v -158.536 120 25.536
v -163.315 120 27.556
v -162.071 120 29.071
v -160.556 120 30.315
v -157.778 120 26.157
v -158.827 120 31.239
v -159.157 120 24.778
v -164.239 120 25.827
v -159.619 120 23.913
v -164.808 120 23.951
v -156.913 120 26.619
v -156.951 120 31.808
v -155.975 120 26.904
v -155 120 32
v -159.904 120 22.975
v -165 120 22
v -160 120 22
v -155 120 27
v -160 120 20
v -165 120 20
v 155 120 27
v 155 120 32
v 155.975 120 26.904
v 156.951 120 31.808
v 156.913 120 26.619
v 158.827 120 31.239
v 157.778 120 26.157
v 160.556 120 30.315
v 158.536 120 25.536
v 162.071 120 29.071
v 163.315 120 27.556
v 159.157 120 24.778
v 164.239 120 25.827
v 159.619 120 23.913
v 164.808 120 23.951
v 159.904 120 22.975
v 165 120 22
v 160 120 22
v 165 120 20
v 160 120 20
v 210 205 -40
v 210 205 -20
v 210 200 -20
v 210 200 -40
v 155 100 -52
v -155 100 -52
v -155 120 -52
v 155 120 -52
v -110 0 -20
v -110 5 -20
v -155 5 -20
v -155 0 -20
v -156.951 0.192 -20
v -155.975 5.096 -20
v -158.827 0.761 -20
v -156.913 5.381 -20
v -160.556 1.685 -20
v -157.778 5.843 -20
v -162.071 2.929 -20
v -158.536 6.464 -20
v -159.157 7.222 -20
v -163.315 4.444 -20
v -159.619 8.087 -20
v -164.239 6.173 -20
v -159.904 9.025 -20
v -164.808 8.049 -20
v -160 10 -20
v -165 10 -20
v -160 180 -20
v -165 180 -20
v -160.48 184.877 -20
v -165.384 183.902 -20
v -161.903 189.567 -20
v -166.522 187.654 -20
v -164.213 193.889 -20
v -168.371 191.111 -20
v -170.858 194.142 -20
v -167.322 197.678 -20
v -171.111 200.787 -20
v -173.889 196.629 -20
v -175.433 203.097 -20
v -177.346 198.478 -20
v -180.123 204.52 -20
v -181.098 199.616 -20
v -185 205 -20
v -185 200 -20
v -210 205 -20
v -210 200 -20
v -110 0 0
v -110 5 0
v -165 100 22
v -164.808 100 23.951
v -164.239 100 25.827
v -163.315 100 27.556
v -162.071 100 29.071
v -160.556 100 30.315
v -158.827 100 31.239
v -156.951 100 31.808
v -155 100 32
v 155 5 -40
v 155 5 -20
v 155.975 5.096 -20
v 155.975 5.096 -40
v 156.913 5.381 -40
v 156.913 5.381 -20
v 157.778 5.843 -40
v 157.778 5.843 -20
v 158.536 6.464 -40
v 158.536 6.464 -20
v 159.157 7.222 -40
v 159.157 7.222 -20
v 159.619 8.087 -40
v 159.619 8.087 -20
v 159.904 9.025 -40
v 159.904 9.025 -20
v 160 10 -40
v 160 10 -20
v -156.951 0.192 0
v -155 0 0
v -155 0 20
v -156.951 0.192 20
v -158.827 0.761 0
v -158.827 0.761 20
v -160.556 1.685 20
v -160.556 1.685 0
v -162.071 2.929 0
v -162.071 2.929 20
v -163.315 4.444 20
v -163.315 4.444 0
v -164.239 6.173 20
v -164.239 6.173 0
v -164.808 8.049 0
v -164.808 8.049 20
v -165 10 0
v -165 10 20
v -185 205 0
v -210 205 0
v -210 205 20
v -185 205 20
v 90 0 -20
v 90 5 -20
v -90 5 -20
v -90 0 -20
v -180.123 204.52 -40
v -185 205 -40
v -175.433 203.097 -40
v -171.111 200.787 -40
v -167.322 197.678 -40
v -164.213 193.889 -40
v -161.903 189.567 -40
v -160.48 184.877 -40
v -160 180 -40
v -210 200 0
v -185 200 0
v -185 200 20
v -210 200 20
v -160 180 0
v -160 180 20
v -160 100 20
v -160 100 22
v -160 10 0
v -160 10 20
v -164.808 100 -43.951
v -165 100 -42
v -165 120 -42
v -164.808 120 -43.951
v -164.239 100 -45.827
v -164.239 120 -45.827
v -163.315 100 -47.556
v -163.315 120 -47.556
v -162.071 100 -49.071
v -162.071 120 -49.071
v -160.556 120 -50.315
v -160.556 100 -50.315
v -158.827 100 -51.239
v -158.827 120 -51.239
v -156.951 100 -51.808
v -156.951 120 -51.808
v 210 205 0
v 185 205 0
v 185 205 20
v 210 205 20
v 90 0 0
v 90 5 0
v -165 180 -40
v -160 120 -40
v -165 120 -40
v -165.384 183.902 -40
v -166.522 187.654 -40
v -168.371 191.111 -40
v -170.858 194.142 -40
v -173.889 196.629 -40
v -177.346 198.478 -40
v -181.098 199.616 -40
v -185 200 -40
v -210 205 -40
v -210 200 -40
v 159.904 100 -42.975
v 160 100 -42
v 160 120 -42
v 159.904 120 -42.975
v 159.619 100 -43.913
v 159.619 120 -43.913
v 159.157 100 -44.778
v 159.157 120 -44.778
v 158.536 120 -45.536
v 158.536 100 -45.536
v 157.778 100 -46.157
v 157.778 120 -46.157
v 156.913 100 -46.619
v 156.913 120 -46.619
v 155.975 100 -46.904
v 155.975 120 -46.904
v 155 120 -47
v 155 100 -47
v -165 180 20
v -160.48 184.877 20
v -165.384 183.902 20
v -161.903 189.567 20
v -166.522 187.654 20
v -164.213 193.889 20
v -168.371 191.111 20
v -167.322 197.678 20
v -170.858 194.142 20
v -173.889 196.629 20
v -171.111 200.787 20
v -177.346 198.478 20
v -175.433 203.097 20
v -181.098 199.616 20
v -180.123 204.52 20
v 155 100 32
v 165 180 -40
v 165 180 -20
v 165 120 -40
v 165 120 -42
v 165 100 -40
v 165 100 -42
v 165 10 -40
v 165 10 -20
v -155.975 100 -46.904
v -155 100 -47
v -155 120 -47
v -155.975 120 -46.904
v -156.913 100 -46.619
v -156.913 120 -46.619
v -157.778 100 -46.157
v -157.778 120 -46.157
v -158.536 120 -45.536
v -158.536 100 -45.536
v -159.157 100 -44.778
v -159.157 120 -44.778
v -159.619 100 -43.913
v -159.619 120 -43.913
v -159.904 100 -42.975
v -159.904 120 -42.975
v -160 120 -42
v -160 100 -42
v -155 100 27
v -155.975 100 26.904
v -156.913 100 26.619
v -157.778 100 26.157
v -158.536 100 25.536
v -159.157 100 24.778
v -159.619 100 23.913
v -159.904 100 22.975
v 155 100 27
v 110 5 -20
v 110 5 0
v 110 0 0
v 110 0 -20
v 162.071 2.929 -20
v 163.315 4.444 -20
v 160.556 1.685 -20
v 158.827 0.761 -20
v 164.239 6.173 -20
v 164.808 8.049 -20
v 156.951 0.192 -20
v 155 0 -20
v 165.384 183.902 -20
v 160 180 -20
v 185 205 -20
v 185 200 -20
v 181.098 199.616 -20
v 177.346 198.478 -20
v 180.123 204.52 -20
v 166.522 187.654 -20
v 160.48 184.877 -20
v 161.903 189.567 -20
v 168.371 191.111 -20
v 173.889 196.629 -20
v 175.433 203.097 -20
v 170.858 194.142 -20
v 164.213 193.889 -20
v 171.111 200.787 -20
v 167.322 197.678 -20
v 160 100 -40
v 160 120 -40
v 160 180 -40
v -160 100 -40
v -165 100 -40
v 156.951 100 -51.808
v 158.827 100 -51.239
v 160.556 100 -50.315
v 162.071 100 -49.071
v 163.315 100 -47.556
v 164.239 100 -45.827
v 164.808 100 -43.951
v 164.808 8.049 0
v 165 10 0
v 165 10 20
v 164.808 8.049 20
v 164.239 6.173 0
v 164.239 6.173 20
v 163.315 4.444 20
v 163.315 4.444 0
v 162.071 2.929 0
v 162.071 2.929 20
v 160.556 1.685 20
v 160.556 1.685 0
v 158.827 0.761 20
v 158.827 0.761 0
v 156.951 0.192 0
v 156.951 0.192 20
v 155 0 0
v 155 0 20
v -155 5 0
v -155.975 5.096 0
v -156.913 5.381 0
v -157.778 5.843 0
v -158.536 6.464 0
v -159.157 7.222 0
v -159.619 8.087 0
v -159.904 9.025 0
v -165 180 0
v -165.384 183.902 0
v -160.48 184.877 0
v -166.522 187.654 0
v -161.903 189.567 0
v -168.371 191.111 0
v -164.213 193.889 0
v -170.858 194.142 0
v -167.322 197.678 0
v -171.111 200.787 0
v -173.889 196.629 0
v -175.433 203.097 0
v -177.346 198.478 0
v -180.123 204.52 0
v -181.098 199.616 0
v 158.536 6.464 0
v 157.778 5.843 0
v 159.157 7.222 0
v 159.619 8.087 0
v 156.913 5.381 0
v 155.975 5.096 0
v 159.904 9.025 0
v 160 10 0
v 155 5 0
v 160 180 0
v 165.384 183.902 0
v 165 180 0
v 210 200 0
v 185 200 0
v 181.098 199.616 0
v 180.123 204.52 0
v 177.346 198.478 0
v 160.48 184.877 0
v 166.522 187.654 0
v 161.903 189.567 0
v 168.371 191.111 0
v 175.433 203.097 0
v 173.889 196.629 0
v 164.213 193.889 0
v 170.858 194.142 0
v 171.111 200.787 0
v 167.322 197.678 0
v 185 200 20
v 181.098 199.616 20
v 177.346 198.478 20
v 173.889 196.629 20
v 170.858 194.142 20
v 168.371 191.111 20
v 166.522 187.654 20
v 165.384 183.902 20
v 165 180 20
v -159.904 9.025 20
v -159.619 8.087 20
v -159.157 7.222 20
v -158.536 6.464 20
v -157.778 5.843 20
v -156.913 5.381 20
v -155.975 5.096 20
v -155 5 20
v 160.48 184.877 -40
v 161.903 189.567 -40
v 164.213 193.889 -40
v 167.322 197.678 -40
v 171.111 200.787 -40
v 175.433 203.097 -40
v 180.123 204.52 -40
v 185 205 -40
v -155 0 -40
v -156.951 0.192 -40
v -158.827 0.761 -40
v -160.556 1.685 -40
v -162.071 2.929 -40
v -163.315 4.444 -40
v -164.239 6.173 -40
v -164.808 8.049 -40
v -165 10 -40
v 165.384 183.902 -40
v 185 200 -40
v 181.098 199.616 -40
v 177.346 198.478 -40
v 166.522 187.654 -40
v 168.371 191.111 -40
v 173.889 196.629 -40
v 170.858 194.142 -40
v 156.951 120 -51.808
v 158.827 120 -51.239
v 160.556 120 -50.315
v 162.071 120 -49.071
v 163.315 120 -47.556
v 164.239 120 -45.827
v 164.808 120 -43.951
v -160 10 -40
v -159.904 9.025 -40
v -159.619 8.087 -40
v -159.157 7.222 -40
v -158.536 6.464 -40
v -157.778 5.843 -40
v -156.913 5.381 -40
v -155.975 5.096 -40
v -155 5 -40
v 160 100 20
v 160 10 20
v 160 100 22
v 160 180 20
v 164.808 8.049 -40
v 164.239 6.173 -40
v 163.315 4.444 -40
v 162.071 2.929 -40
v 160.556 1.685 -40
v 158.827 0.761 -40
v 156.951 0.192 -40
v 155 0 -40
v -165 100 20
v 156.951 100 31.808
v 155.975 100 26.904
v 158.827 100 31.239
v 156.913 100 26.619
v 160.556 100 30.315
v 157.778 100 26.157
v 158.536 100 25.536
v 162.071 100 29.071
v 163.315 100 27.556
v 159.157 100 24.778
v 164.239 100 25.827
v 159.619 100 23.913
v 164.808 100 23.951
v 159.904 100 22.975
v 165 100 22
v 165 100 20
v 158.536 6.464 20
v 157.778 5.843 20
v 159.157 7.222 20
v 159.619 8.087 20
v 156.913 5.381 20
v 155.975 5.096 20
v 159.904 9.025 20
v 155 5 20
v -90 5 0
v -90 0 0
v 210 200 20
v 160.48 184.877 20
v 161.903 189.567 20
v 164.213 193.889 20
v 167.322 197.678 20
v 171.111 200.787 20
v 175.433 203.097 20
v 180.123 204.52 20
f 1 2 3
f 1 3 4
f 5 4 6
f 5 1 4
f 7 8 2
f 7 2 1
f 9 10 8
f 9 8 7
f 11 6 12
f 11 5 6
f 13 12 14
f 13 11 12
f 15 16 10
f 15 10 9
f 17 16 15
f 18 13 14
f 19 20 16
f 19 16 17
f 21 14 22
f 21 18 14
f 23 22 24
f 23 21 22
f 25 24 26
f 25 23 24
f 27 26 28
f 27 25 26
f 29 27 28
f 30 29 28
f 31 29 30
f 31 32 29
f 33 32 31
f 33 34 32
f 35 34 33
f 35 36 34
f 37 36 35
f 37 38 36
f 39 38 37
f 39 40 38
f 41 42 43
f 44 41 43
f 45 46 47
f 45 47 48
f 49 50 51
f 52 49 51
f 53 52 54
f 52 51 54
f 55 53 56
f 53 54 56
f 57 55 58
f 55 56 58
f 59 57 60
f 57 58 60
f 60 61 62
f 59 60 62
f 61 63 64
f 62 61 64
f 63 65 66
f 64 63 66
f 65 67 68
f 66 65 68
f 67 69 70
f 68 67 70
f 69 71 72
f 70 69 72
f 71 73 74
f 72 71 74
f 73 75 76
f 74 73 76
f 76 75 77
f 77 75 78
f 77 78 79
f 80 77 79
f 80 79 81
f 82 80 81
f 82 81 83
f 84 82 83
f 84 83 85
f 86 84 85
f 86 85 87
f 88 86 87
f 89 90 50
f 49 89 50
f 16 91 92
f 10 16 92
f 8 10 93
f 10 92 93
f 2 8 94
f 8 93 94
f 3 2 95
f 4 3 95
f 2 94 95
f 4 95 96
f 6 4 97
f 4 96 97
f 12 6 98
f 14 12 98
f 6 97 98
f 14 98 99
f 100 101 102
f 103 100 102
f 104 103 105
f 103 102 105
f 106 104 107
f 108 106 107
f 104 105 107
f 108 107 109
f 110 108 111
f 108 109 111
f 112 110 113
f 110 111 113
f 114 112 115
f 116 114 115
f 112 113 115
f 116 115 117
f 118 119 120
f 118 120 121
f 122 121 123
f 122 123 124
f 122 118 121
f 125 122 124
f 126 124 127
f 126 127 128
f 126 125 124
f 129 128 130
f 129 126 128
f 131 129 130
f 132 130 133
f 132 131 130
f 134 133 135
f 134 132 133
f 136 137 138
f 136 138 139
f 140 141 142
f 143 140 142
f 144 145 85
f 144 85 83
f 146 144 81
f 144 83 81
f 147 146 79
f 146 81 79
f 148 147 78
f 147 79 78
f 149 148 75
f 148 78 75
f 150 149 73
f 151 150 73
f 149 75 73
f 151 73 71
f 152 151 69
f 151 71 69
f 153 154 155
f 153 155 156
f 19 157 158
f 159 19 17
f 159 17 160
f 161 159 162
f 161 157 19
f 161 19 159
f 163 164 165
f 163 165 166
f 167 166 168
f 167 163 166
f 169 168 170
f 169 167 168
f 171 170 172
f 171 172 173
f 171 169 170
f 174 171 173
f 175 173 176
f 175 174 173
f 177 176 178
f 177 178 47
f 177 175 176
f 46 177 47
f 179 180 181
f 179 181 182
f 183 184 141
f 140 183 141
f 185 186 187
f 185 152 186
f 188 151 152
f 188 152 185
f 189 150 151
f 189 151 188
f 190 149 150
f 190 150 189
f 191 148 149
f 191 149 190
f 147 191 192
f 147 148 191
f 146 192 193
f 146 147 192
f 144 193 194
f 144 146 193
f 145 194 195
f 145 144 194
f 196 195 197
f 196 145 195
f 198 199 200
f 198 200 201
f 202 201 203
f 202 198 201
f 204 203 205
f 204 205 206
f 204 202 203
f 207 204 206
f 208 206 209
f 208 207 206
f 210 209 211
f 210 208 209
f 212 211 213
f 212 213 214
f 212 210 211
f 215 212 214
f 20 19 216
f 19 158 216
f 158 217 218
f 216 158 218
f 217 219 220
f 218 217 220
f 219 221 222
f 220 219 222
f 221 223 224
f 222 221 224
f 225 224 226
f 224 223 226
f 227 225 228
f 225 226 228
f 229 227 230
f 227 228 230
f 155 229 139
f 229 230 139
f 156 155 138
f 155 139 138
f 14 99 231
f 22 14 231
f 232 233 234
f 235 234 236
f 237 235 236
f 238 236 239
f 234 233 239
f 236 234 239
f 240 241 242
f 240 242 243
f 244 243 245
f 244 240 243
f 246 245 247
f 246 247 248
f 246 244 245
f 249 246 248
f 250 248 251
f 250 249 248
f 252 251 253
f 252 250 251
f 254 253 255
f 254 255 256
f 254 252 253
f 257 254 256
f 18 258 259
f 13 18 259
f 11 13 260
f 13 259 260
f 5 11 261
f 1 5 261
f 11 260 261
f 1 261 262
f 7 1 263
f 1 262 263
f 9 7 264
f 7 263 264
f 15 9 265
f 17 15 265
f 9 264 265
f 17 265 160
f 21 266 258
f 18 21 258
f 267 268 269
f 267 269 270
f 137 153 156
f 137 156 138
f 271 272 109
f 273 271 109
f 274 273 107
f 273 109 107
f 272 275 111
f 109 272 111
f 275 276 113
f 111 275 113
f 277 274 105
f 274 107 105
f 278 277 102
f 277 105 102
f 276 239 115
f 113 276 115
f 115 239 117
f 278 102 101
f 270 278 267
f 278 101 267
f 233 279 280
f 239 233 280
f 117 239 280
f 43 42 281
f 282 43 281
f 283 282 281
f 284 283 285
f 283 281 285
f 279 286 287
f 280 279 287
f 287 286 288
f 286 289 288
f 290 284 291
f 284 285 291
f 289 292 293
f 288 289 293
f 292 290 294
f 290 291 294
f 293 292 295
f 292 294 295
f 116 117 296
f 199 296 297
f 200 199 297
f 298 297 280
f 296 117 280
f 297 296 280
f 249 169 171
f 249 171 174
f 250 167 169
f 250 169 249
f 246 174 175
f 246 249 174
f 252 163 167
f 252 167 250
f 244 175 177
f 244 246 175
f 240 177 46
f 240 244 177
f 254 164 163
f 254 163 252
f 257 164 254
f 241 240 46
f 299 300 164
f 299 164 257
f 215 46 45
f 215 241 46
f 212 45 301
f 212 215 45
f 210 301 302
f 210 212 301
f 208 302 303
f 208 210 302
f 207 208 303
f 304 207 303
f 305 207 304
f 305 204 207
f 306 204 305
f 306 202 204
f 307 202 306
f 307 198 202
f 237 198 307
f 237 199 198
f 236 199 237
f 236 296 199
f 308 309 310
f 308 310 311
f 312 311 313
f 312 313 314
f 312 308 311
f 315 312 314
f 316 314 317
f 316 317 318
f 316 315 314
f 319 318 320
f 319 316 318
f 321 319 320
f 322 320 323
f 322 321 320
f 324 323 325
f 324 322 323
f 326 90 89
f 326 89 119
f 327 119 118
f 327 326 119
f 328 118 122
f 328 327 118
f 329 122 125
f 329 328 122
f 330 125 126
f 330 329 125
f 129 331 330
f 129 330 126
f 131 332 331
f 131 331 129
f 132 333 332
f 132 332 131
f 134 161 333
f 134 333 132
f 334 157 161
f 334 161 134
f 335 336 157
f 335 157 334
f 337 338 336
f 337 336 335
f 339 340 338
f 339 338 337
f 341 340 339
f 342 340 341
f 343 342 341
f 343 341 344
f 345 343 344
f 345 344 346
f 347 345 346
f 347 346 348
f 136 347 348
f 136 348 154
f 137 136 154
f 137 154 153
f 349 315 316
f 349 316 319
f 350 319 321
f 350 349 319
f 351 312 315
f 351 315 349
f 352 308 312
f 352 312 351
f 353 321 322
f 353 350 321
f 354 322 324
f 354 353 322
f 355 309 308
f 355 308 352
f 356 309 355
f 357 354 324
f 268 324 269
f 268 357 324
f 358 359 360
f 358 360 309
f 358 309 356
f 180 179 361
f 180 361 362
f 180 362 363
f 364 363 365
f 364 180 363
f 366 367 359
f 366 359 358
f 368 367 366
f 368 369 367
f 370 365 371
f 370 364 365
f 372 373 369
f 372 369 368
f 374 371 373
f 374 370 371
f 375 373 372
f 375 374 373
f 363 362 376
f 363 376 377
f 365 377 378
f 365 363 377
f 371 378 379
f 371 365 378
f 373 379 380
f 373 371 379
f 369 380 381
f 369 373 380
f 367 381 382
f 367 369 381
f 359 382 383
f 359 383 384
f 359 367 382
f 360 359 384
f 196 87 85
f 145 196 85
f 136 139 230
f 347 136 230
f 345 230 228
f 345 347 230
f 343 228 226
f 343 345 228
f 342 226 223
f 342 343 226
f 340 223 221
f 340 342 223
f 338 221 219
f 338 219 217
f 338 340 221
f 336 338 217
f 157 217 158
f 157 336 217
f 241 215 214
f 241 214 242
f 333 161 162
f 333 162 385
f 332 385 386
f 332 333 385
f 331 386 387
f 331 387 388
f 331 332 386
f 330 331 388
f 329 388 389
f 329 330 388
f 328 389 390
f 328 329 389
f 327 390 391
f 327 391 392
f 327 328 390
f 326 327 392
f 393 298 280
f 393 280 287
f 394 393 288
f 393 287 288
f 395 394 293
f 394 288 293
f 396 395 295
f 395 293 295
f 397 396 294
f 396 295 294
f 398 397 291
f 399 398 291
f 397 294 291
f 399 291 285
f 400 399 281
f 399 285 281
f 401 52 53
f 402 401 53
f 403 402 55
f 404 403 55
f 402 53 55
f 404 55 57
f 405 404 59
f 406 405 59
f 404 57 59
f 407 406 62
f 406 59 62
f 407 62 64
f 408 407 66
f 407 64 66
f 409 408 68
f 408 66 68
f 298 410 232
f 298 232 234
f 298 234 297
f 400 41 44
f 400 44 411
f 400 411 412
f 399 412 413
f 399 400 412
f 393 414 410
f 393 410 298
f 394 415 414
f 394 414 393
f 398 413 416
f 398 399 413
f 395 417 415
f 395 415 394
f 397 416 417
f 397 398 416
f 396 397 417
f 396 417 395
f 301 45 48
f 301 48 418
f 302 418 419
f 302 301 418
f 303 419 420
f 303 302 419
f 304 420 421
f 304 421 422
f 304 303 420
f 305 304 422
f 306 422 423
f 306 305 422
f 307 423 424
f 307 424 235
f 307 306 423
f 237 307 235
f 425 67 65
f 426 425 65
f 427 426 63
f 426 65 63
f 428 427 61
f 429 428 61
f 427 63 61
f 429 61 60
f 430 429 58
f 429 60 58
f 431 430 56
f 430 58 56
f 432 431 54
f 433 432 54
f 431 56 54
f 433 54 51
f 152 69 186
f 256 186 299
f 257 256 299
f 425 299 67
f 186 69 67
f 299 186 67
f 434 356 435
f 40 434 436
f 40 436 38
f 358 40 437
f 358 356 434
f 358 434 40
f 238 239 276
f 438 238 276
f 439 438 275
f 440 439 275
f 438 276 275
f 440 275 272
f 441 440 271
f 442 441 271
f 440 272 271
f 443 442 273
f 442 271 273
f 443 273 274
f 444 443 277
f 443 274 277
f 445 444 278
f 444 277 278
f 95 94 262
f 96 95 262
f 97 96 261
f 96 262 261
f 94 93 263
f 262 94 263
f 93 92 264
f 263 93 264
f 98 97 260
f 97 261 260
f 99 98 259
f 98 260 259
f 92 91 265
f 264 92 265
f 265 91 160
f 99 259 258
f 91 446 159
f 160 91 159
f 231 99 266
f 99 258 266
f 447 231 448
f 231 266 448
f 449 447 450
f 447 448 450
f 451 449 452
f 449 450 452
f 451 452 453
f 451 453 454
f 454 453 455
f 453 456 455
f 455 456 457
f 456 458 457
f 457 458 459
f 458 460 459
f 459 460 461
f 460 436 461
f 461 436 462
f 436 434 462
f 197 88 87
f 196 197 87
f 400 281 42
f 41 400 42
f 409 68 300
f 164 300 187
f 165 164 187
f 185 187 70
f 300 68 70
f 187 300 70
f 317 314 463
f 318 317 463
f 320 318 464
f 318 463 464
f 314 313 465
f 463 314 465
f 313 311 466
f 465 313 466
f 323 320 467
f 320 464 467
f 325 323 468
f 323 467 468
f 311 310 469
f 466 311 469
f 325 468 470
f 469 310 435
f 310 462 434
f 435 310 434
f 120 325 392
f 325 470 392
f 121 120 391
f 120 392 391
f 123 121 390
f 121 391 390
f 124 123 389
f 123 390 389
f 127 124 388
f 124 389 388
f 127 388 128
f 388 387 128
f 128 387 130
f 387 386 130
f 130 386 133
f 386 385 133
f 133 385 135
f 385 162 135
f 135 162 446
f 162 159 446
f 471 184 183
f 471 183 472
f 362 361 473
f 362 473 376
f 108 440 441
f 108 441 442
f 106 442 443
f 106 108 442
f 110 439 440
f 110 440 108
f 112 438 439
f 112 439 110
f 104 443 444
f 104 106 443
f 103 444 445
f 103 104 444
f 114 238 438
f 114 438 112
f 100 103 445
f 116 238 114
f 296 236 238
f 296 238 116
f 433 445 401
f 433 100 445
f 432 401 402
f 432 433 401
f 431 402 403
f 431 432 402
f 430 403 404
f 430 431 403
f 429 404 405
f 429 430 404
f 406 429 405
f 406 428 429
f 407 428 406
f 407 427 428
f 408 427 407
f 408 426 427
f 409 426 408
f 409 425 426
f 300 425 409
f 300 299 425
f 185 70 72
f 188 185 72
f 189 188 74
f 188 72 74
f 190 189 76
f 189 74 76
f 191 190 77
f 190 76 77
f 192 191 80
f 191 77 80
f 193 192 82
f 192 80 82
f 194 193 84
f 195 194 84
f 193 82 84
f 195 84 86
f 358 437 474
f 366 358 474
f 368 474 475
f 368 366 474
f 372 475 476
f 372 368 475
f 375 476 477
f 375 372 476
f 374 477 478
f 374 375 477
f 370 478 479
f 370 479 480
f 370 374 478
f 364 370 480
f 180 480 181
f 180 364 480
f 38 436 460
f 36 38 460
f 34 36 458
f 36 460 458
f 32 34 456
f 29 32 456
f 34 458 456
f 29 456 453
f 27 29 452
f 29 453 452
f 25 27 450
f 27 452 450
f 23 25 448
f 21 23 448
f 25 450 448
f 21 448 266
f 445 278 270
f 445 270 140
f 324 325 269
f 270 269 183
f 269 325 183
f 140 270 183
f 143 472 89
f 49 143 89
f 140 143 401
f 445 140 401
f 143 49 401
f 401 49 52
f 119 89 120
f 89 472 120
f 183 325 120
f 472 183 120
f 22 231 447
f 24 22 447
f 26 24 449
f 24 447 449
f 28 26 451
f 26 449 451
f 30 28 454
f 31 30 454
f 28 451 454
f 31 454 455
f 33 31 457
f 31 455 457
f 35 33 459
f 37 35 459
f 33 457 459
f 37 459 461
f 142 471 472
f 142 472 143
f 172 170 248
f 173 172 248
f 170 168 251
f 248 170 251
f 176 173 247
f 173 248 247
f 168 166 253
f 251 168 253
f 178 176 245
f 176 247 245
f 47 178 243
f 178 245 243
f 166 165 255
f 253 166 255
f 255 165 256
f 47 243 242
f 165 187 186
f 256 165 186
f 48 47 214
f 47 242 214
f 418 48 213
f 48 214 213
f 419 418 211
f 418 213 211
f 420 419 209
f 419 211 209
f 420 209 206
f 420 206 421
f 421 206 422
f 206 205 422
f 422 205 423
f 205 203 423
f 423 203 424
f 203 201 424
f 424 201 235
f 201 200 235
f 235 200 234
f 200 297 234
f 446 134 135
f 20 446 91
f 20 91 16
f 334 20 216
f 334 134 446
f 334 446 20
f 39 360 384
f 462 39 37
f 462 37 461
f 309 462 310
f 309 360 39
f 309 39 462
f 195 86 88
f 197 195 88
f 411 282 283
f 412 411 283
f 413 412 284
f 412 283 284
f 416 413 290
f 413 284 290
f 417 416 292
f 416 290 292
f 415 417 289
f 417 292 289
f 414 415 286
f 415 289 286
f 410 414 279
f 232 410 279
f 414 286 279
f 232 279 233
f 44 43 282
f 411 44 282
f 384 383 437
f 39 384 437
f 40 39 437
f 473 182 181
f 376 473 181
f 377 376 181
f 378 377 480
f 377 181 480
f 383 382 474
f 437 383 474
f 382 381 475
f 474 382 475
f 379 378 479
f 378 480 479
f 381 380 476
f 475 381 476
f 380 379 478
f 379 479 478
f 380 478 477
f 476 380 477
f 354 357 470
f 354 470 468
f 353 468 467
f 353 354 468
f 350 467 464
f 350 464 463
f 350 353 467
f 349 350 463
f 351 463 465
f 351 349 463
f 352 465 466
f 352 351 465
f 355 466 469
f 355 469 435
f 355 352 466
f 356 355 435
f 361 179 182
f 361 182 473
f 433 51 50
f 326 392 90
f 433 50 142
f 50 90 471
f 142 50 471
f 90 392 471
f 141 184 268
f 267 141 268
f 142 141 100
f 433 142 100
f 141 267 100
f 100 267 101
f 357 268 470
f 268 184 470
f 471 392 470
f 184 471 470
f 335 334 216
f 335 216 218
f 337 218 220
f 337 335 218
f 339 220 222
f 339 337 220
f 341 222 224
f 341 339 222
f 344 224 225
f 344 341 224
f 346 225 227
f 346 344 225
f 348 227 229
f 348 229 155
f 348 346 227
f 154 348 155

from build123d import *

# Parameters (mm, degrees)
EXTRUDE_1_DEPTH   = 20
EXTRUDE_2_DEPTH   = 20
SKETCH_3_W        = 20
SKETCH_3_H        = 20
EXTRUDE_1_2_DEPTH = 5


with BuildPart() as part:
    # 草图1 → Extrude 1 (new body)
    with BuildSketch(Plane.XY):
        with BuildLine():
            Line((210, 200), (185, 200))
            ThreePointArc((185, 200), (170.857864376, 194.142135624), (165, 180))
            Line((165, 180), (165, 10))
            ThreePointArc((165, 10), (162.071067812, 2.928932188), (155, 0))
            Line((155, 0), (-155, 0))
            ThreePointArc((-155, 0), (-162.071067812, 2.928932188), (-165, 10))
            Line((-165, 10), (-165, 180))
            ThreePointArc((-165, 180), (-170.857864376, 194.142135624), (-185, 200))
            Line((-185, 200), (-210, 200))
            Line((-210, 200), (-210, 205))
            Line((-210, 205), (-185, 205))
            ThreePointArc((-185, 205), (-167.32233047, 197.67766953), (-160, 180))
            Line((-160, 180), (-160, 10))
            ThreePointArc((-160, 10), (-158.535533906, 6.464466094), (-155, 5))
            Line((-155, 5), (155, 5))
            ThreePointArc((155, 5), (158.535533906, 6.464466094), (160, 10))
            Line((160, 10), (160, 180))
            ThreePointArc((160, 180), (167.32233047, 197.67766953), (185, 205))
            Line((185, 205), (210, 205))
            Line((210, 205), (210, 200))
        make_face()
    extrude(amount=EXTRUDE_1_DEPTH)

    # 草图2 → 拉伸-薄壁2 (add)
    with BuildSketch(Plane(origin=(0, 100, 0), x_dir=(1, 0, 0), z_dir=(0, 1, 0))):
        with BuildLine():
            Line((-165, -20), (-165, -22))
            ThreePointArc((-165, -22), (-162.071067812, -29.071067812), (-155, -32))
            Line((-155, -32), (155, -32))
            ThreePointArc((155, -32), (162.071067812, -29.071067812), (165, -22))
            Line((165, -22), (165, -20))
            Line((165, -20), (160, -20))
            Line((160, -20), (160, -22))
            ThreePointArc((160, -22), (158.535533906, -25.535533906), (155, -27))
            Line((155, -27), (-155, -27))
            ThreePointArc((-155, -27), (-158.535533906, -25.535533906), (-160, -22))
            Line((-160, -22), (-160, -20))
            Line((-160, -20), (-165, -20))
        make_face()
    extrude(amount=EXTRUDE_2_DEPTH)


with BuildPart() as body_2:
    # 镜向3: mirrored copy
    add(part.part.mirror(Plane.XY.offset(-10)))


with BuildPart() as part_1:
    add(part.part)

    add(body_2.part)  # Extrude 1 2 merges body 2
    # 草图3 → Extrude 1 2 (add)
    with BuildSketch(Plane(origin=(0, 5, 0), x_dir=(1, 0, 0), z_dir=(0, 1, 0))):
        with Locations((-100, 10)):
            Rectangle(SKETCH_3_W, SKETCH_3_H)
    extrude_1_2 = extrude(amount=-EXTRUDE_1_2_DEPTH)

    # 镜向4: Extrude 1 2 across plane
    add(extrude_1_2.mirror(Plane(origin=(0, 0, 0), x_dir=(0, 0, 1), z_dir=(1, 0, 0))))


solid = part_1.part
